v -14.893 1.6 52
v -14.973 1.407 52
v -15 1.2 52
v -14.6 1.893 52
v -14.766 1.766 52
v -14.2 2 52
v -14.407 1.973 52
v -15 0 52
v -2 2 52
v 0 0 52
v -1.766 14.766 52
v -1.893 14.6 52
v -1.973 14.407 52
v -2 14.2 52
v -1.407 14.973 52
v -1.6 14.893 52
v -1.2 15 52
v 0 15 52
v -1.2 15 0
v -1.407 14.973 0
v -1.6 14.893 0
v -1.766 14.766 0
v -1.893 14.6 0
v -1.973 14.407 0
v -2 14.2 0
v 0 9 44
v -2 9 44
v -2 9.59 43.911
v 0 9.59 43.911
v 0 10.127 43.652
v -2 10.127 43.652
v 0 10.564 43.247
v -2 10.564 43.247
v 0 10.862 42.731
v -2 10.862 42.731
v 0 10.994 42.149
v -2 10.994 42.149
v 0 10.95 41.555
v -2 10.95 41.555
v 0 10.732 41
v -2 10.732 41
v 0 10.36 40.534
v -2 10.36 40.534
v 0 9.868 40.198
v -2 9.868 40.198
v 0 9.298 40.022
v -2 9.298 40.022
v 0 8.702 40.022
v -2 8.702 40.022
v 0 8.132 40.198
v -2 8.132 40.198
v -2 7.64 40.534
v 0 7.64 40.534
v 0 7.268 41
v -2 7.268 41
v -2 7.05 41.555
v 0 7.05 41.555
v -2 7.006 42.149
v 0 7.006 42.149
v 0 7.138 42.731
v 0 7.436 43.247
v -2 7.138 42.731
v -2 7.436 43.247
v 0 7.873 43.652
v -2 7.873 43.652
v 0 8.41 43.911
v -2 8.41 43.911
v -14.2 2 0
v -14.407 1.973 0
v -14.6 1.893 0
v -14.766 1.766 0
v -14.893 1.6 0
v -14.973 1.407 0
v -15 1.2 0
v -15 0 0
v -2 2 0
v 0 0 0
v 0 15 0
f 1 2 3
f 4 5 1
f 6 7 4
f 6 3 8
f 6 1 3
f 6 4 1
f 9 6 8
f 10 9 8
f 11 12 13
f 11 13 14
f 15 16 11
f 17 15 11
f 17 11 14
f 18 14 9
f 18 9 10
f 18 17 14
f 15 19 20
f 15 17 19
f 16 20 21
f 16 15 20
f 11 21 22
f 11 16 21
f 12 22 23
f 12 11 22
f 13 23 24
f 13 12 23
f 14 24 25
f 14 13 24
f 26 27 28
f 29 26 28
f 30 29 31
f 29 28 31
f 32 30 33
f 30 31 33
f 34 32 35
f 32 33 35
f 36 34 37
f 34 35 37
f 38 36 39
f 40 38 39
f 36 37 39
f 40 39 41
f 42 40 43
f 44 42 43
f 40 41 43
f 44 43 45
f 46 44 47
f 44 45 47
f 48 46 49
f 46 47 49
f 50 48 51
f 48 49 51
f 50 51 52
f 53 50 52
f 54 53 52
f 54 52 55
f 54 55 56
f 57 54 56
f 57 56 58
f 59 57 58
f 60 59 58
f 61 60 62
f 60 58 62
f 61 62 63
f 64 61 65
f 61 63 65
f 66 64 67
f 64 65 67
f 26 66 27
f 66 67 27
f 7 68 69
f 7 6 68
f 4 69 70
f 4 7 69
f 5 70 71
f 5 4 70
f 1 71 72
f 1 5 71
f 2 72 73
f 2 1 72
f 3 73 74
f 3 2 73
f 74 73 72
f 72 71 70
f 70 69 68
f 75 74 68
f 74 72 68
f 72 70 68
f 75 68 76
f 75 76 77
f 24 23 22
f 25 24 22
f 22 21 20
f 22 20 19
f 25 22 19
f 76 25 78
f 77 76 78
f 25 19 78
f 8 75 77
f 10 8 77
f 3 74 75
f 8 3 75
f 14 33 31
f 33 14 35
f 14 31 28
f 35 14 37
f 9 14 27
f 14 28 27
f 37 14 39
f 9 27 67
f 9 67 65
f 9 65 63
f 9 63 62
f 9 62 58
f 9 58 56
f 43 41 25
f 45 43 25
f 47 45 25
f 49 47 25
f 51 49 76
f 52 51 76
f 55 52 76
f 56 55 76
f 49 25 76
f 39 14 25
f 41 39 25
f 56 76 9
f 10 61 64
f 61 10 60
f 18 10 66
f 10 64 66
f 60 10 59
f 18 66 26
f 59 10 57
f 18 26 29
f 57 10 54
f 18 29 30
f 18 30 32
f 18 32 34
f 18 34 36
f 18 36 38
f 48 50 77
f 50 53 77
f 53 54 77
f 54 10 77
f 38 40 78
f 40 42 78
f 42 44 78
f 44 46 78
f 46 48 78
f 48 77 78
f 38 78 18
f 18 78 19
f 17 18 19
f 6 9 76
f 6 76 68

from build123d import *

# Parameters (mm, degrees)
EXTRUDE_1_DEPTH     = 52
FILLET_1_R          = 0.8
SKETCH_3_R          = 2
CUT_EXTRUDE_2_DEPTH = 2


with BuildPart() as part:
    # 草图1 → 凸台-拉伸1 (new body)
    with BuildSketch(Plane.XY):
        Polygon((0, 0), (0, 15), (-2, 15), (-2, 2), (-15, 2), (-15, 0), align=None)
    extrude(amount=EXTRUDE_1_DEPTH)

    # 圆角1
    fillet_1_edges = [part.edges().sort_by_distance(p)[0] for p in [
        (-15, 2, 26),
        (-2, 15, 26),
    ]]
    fillet(fillet_1_edges, radius=FILLET_1_R)

    # 草图3 → 切除-拉伸2 (cut)
    with BuildSketch(Plane.ZY.offset(2)):
        with Locations((42, 9)):
            Circle(SKETCH_3_R)
    extrude(amount=-CUT_EXTRUDE_2_DEPTH, mode=Mode.SUBTRACT)


solid = part.part
